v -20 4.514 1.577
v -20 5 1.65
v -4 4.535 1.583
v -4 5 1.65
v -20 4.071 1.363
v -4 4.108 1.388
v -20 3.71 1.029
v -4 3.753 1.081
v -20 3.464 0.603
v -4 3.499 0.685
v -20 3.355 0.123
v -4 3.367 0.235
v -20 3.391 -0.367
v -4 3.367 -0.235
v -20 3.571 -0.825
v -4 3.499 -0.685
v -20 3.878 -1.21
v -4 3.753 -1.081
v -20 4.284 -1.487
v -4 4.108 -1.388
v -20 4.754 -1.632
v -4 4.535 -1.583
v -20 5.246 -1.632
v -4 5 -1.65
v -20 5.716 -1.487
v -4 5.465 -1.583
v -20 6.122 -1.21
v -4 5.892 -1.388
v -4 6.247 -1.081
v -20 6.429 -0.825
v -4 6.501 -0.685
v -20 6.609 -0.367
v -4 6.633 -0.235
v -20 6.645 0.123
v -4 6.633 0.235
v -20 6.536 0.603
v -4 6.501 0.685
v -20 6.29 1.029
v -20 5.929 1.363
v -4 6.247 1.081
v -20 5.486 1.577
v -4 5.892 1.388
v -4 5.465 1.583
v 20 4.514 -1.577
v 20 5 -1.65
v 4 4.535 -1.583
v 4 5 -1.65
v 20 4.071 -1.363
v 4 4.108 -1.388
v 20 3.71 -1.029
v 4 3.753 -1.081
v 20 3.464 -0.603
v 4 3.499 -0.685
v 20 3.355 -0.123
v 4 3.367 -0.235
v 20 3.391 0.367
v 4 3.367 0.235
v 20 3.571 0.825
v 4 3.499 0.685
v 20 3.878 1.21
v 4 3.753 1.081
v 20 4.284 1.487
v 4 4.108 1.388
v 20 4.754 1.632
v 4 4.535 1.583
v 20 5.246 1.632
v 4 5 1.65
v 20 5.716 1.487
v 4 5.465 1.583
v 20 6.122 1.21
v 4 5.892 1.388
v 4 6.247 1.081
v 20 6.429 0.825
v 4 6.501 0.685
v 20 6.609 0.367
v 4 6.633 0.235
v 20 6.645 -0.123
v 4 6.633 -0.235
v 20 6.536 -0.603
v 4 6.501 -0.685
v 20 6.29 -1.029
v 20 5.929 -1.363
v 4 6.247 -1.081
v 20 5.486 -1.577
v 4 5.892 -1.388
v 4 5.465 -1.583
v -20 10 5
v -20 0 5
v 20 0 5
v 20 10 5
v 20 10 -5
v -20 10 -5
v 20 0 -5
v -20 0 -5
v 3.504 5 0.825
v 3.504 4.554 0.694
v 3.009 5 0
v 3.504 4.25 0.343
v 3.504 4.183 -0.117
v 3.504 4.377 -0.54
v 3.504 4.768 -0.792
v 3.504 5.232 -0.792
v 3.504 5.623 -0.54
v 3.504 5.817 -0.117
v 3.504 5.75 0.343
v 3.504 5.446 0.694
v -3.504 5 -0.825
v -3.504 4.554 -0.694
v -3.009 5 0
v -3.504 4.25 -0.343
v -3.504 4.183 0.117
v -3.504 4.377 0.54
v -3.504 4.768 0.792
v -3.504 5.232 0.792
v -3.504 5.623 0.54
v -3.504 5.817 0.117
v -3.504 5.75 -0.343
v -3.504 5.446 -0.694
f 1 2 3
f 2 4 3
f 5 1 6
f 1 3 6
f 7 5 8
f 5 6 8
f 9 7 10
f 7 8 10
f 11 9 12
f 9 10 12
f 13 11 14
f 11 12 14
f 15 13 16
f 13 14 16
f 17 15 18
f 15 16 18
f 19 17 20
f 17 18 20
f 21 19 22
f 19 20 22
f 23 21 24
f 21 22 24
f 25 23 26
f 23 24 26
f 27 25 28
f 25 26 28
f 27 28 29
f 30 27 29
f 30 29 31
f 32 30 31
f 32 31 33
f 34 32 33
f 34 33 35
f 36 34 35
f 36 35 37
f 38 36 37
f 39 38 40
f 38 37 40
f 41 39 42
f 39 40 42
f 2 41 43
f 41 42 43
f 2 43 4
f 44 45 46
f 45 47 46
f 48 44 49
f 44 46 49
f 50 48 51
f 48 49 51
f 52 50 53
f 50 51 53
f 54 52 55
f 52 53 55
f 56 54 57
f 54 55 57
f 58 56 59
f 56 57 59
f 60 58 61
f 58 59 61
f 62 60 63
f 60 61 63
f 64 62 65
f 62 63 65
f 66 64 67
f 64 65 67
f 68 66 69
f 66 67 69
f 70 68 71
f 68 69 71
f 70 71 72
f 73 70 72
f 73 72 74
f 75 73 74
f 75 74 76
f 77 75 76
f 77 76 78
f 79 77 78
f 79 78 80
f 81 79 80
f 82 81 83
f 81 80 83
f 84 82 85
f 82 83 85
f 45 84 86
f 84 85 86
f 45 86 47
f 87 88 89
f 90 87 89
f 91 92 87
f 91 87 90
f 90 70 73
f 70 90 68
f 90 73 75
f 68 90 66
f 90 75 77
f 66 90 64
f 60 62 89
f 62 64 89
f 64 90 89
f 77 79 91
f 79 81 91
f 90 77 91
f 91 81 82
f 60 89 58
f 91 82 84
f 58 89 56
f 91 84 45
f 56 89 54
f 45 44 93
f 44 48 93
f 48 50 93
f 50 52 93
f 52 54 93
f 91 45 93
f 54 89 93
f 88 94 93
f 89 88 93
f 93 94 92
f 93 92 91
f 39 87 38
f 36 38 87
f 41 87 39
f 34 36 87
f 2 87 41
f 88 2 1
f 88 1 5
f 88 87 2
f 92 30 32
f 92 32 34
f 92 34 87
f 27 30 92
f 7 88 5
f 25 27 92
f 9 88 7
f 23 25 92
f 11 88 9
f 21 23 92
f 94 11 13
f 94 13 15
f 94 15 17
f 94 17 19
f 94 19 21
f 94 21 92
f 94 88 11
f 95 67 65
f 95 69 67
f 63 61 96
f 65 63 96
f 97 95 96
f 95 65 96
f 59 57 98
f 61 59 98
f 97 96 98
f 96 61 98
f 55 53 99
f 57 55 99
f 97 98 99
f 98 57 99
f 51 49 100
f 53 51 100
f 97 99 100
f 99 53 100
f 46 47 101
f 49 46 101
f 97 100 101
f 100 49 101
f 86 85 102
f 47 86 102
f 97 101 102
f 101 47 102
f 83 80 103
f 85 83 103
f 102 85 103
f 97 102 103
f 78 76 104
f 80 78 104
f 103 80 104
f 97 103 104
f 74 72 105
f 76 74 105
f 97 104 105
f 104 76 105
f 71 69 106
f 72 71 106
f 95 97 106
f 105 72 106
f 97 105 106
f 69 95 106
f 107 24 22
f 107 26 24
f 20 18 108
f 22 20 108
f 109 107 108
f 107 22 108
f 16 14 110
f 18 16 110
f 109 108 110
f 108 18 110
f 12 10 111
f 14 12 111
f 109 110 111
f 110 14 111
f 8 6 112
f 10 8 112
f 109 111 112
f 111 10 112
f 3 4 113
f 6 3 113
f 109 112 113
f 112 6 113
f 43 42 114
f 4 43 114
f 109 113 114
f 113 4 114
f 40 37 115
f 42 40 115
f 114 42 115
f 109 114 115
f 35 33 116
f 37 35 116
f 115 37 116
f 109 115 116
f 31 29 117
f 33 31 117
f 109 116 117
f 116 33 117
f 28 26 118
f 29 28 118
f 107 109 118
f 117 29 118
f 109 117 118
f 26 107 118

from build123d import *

# Parameters (mm, degrees)
SKETCH1_W                           = 40
SKETCH1_H                           = 10
BOSS_EXTRUDE1_DEPTH                 = 10
M4X0_7_TAPPED_HOLE1_D               = 3.3
M4X0_7_TAPPED_HOLE1_DEPTH           = 16
M4X0_7_TAPPED_HOLE1_TIP             = 0.991420021
M4X0_7_TAPPED_HOLE1_ON_FACE_2_D     = 3.3
M4X0_7_TAPPED_HOLE1_ON_FACE_2_DEPTH = 16
M4X0_7_TAPPED_HOLE1_ON_FACE_2_TIP   = 0.991420021


with BuildPart() as part:
    # Sketch1 → Boss-Extrude1 (new body)
    with BuildSketch(Plane(origin=(0, 0, 0), x_dir=(1, 0, 0), z_dir=(0, 1, 0))):
        Rectangle(SKETCH1_W, SKETCH1_H)
    extrude(amount=BOSS_EXTRUDE1_DEPTH)

    # M4x0.7 Tapped Hole1
    with Locations(Plane(origin=(-20, 5, 0), x_dir=(0, 0, -1), z_dir=(-1, 0, 0))):
        with Locations((0, 0)):
            Hole(M4X0_7_TAPPED_HOLE1_D / 2, depth=M4X0_7_TAPPED_HOLE1_DEPTH)
            with Locations((0, 0, -(M4X0_7_TAPPED_HOLE1_DEPTH + M4X0_7_TAPPED_HOLE1_TIP / 2))):  # 118° drill point
                Cone(0, M4X0_7_TAPPED_HOLE1_D / 2, M4X0_7_TAPPED_HOLE1_TIP, mode=Mode.SUBTRACT)

    # M4x0.7 Tapped Hole1 on face 2
    with Locations(Plane(origin=(20, 5, 0), x_dir=(0, 0, 1), z_dir=(1, 0, 0))):
        with Locations((0, 0)):
            Hole(M4X0_7_TAPPED_HOLE1_ON_FACE_2_D / 2, depth=M4X0_7_TAPPED_HOLE1_ON_FACE_2_DEPTH)
            with Locations((0, 0, -(M4X0_7_TAPPED_HOLE1_ON_FACE_2_DEPTH + M4X0_7_TAPPED_HOLE1_ON_FACE_2_TIP / 2))):  # 118° drill point
                Cone(0, M4X0_7_TAPPED_HOLE1_ON_FACE_2_D / 2, M4X0_7_TAPPED_HOLE1_ON_FACE_2_TIP, mode=Mode.SUBTRACT)


solid = part.part
